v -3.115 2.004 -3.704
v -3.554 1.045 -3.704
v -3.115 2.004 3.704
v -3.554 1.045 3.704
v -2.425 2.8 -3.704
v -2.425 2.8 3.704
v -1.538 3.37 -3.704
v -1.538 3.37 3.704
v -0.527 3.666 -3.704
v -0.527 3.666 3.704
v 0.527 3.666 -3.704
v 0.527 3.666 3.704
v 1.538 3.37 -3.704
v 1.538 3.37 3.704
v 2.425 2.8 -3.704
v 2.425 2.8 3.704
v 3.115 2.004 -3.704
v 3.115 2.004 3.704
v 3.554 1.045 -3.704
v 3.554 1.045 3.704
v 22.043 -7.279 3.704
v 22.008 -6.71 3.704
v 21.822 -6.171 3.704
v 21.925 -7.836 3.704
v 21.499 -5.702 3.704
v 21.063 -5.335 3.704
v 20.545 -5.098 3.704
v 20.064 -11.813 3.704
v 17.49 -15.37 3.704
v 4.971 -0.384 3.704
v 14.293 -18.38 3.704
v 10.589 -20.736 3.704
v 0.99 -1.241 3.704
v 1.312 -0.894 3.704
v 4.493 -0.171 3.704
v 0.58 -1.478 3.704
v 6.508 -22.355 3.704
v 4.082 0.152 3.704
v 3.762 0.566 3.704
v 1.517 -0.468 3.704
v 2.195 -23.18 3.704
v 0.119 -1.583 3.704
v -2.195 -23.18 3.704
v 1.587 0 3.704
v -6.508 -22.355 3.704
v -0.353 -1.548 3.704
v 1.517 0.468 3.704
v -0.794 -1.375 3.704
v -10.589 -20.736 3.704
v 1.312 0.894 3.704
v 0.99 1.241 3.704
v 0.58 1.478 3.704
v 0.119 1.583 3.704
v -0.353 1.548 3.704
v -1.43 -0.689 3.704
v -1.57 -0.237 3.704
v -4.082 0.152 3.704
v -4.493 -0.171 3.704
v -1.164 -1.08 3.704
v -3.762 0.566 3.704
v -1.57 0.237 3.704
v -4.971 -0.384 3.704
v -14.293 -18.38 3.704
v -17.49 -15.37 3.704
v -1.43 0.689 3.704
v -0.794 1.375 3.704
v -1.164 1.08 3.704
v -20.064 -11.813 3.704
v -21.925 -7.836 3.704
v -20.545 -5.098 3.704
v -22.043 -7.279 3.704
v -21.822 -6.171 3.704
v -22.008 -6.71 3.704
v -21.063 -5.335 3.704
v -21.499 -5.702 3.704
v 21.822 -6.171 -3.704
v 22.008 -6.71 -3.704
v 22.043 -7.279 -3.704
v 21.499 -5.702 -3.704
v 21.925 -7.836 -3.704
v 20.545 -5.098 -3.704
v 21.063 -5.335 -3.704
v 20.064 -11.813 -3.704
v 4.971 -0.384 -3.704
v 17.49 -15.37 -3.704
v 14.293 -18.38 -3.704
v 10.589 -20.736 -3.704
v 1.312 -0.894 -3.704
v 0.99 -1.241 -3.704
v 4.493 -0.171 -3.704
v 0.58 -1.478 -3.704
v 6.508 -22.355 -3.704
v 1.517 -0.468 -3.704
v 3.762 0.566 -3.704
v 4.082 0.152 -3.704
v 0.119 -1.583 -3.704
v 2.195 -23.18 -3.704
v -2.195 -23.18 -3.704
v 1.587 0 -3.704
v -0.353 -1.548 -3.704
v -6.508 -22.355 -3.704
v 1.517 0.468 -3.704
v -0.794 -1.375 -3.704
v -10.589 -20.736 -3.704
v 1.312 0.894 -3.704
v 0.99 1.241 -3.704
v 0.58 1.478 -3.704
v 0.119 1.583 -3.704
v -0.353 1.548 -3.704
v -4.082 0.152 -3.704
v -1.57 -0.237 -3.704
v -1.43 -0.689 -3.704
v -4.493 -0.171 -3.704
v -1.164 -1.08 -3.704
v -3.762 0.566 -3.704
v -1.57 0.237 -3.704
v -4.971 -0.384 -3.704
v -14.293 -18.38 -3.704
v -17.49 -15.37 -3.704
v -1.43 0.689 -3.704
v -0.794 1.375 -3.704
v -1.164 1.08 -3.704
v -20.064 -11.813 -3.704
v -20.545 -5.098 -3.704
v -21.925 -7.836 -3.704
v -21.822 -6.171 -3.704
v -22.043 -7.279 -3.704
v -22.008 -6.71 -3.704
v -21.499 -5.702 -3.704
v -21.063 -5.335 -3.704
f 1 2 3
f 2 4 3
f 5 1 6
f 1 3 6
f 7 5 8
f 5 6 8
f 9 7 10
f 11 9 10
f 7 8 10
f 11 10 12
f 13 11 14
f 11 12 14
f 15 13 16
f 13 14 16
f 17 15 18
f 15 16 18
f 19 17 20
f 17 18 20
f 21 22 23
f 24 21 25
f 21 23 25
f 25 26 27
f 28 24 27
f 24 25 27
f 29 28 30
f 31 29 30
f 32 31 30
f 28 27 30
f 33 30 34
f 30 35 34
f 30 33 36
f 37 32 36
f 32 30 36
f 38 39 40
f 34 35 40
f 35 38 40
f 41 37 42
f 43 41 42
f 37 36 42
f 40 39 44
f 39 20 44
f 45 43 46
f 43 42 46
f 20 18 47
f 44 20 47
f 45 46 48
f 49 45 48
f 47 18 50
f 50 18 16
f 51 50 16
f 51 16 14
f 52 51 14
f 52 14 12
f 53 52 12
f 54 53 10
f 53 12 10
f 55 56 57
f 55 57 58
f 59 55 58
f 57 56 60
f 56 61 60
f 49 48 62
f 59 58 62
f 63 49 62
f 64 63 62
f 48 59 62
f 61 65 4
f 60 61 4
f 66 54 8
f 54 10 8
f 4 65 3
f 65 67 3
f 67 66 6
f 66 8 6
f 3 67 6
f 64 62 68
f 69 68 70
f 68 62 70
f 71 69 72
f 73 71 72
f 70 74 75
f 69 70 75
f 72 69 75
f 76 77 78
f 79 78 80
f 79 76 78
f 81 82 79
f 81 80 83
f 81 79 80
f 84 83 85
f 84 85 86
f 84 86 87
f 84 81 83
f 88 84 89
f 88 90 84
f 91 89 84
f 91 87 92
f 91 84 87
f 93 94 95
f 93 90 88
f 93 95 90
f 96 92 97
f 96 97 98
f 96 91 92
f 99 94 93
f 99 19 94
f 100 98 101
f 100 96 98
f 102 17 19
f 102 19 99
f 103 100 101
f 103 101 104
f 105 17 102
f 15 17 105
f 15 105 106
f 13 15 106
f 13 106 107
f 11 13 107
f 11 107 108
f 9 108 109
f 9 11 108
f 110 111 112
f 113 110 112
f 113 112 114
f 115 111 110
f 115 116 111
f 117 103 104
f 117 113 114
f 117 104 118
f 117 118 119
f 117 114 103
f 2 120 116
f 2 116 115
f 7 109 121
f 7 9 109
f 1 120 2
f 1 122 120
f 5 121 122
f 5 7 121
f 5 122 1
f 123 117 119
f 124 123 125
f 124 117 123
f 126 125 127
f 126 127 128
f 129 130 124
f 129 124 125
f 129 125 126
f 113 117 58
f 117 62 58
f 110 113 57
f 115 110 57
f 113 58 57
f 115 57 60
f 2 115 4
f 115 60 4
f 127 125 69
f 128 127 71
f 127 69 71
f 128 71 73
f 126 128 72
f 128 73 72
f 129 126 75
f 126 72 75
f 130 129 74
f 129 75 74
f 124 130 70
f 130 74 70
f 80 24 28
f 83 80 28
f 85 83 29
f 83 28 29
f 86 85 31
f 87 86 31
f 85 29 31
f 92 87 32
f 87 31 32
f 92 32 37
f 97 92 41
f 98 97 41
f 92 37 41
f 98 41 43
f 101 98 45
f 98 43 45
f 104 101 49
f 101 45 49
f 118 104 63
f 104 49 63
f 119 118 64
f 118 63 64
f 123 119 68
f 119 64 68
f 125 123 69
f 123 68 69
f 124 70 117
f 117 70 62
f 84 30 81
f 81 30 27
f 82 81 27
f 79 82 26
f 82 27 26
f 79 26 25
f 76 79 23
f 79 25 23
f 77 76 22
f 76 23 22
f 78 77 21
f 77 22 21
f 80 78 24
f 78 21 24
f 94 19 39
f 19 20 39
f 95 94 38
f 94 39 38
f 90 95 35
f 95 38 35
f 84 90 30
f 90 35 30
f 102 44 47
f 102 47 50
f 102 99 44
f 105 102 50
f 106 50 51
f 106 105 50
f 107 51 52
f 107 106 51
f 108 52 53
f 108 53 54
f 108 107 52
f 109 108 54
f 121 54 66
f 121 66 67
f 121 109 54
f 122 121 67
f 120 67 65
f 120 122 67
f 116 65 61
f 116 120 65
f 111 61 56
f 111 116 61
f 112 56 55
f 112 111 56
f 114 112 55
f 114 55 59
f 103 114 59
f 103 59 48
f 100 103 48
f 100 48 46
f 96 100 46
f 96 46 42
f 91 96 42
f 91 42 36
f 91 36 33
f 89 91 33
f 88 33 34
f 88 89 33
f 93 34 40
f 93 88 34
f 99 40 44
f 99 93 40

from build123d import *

# Parameters (mm, degrees)
SKETCH2_R           = 19.05
BOSS_EXTRUDE1_DEPTH = 44.45
SCALE1_SCALE        = 0.083333333


with BuildPart() as part:
    # Sketch2 → Boss-Extrude1 (new body, symmetric)
    with BuildSketch(Plane.XY):
        with BuildLine():
            Line((-246.541287735, -61.175642711), (-59.652807836, -4.602086269))
            ThreePointArc((-59.652807836, -4.602086269), (-48.980567788, 1.8190908), (-42.643954444, 12.541756231))
            ThreePointArc((-42.643954444, 12.541756231), (0, 44.45), (42.643954444, 12.541756231))
            ThreePointArc((42.643954444, 12.541756231), (48.980567788, 1.8190908), (59.652807836, -4.602086269))
            Line((59.652807836, -4.602086269), (246.541287735, -61.175642711))
            ThreePointArc((246.541287735, -61.175642711), (261.864746274, -74.055516083), (263.100383875, -94.034823363))
            ThreePointArc((263.100383875, -94.034823363), (0, -279.4), (-263.100383875, -94.034823363))
            ThreePointArc((-263.100383875, -94.034823363), (-261.864746274, -74.055516083), (-246.541287735, -61.175642711))
        make_face()
        Circle(SKETCH2_R, mode=Mode.SUBTRACT)
    extrude(amount=BOSS_EXTRUDE1_DEPTH, both=True)


with BuildPart() as part_1:
    # Scale1: scaled about (0, 0, 0)
    add(part.part.scale(SCALE1_SCALE))


solid = part_1.part
